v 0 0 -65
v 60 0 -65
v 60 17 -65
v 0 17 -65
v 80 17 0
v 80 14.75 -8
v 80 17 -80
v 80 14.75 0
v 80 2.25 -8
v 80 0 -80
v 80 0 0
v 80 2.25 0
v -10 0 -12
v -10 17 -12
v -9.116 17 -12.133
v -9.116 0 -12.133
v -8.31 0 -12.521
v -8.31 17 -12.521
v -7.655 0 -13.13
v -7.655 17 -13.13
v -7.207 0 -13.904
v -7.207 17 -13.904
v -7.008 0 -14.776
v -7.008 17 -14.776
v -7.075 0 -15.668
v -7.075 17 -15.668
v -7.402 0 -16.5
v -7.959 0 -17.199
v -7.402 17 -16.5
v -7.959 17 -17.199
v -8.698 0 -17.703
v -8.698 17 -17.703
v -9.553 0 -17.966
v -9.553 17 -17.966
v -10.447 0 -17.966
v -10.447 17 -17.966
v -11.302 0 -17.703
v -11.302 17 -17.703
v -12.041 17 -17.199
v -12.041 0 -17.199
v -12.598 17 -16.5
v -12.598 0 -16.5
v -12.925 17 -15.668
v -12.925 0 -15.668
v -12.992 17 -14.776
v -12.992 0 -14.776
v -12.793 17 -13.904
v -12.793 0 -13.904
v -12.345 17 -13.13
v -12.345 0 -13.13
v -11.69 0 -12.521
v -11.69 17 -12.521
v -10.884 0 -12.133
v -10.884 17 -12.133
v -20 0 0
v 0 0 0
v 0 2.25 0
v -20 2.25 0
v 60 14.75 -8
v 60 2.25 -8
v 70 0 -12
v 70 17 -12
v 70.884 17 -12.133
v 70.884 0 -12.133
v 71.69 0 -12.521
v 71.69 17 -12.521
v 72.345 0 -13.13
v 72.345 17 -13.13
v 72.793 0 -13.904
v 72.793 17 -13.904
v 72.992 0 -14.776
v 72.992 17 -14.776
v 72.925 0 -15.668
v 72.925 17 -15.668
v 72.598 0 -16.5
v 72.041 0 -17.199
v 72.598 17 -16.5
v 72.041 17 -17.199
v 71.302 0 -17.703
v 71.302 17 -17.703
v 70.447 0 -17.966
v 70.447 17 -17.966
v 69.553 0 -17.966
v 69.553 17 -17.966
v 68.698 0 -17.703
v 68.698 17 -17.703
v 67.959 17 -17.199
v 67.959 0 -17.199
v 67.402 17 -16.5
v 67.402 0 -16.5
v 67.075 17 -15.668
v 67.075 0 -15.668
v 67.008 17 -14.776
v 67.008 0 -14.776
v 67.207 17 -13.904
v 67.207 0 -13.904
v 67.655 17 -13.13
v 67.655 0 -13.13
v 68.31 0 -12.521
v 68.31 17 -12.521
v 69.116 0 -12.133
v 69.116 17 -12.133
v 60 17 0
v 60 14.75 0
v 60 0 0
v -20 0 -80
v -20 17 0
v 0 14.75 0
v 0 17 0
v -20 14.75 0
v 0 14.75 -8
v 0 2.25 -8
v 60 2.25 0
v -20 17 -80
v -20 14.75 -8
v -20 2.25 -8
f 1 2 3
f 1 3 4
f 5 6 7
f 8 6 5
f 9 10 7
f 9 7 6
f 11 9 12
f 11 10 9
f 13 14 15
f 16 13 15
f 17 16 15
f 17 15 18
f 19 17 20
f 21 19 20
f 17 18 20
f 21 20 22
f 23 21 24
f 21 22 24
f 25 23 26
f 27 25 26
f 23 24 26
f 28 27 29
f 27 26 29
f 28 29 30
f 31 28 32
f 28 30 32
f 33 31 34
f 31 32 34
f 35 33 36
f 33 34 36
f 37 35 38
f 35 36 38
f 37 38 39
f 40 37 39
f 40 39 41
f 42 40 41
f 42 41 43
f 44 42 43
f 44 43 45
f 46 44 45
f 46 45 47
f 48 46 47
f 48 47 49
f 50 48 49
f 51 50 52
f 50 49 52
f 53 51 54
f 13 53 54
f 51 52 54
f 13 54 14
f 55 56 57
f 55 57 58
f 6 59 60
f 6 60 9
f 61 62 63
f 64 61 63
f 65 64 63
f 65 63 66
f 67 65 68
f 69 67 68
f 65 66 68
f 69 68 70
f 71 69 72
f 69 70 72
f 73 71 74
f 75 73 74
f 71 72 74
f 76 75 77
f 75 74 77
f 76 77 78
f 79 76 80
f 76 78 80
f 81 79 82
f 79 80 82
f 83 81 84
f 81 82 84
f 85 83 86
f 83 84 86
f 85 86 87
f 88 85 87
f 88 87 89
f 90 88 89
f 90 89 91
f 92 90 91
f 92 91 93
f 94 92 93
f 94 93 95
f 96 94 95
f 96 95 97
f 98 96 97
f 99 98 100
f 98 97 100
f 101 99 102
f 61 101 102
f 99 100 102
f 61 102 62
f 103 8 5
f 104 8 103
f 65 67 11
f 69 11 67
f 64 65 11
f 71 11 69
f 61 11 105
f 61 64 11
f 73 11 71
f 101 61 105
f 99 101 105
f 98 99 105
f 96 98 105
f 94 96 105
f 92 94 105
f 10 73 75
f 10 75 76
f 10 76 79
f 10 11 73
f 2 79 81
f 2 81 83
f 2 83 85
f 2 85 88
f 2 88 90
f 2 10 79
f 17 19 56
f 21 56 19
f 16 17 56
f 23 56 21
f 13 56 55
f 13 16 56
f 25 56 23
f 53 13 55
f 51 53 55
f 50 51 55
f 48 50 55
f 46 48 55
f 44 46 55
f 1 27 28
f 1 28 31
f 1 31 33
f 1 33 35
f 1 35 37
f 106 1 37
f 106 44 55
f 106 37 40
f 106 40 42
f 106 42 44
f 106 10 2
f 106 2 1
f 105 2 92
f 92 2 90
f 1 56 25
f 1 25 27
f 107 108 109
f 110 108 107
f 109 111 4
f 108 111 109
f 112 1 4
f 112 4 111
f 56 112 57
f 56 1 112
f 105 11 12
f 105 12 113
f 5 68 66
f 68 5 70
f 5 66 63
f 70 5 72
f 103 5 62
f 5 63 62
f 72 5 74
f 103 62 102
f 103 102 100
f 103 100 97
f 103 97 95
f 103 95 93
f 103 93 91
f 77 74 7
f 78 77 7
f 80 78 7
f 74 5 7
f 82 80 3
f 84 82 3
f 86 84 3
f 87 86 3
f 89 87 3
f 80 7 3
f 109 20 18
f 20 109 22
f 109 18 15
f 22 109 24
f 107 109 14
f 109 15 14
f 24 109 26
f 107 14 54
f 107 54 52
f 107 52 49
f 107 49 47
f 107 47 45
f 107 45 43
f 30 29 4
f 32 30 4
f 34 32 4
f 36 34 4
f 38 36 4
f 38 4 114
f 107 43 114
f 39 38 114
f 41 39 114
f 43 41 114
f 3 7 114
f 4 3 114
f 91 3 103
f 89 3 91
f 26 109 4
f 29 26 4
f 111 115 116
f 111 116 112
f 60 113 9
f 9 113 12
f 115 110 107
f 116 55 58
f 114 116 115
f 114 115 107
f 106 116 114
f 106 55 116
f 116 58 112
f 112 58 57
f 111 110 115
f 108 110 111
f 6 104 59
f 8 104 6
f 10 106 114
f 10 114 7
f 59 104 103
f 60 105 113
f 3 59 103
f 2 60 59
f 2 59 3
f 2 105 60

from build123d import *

# Parameters (mm, degrees)
SALIENTE_EXTRUIR1_DEPTH = 17
CROQUIS2_W              = 100
CROQUIS2_H              = 12.5
CORTAR_EXTRUIR1_DEPTH   = 8
CROQUIS3_R              = 3
CORTAR_EXTRUIR2_DEPTH   = 17


with BuildPart() as part:
    # Croquis1 → Saliente-Extruir1 (new body)
    with BuildSketch(Plane(origin=(0, 0, 0), x_dir=(1, 0, 0), z_dir=(0, 1, 0))):
        Polygon((0, 0), (-20, 0), (-20, 80), (80, 80), (80, 0), (60, 0), (60, 65), (0, 65), align=None)
    extrude(amount=SALIENTE_EXTRUIR1_DEPTH)

    # Croquis2 → Cortar-Extruir1 (cut)
    with BuildSketch(Plane.XY):
        with Locations((30, 8.5)):
            Rectangle(CROQUIS2_W, CROQUIS2_H)
    extrude(amount=-CORTAR_EXTRUIR1_DEPTH, mode=Mode.SUBTRACT)

    # Croquis3 → Cortar-Extruir2 (cut)
    with BuildSketch(Plane(origin=(0, 17, 0), x_dir=(1, 0, 0), z_dir=(0, 1, 0))):
        with Locations(Location((-10, 15, 0), (0, 0, 270))):
            Circle(CROQUIS3_R)
        with Locations(Location((70, 15, 0), (0, 0, 270))):
            Circle(CROQUIS3_R)
    extrude(amount=-CORTAR_EXTRUIR2_DEPTH, mode=Mode.SUBTRACT)


solid = part.part
